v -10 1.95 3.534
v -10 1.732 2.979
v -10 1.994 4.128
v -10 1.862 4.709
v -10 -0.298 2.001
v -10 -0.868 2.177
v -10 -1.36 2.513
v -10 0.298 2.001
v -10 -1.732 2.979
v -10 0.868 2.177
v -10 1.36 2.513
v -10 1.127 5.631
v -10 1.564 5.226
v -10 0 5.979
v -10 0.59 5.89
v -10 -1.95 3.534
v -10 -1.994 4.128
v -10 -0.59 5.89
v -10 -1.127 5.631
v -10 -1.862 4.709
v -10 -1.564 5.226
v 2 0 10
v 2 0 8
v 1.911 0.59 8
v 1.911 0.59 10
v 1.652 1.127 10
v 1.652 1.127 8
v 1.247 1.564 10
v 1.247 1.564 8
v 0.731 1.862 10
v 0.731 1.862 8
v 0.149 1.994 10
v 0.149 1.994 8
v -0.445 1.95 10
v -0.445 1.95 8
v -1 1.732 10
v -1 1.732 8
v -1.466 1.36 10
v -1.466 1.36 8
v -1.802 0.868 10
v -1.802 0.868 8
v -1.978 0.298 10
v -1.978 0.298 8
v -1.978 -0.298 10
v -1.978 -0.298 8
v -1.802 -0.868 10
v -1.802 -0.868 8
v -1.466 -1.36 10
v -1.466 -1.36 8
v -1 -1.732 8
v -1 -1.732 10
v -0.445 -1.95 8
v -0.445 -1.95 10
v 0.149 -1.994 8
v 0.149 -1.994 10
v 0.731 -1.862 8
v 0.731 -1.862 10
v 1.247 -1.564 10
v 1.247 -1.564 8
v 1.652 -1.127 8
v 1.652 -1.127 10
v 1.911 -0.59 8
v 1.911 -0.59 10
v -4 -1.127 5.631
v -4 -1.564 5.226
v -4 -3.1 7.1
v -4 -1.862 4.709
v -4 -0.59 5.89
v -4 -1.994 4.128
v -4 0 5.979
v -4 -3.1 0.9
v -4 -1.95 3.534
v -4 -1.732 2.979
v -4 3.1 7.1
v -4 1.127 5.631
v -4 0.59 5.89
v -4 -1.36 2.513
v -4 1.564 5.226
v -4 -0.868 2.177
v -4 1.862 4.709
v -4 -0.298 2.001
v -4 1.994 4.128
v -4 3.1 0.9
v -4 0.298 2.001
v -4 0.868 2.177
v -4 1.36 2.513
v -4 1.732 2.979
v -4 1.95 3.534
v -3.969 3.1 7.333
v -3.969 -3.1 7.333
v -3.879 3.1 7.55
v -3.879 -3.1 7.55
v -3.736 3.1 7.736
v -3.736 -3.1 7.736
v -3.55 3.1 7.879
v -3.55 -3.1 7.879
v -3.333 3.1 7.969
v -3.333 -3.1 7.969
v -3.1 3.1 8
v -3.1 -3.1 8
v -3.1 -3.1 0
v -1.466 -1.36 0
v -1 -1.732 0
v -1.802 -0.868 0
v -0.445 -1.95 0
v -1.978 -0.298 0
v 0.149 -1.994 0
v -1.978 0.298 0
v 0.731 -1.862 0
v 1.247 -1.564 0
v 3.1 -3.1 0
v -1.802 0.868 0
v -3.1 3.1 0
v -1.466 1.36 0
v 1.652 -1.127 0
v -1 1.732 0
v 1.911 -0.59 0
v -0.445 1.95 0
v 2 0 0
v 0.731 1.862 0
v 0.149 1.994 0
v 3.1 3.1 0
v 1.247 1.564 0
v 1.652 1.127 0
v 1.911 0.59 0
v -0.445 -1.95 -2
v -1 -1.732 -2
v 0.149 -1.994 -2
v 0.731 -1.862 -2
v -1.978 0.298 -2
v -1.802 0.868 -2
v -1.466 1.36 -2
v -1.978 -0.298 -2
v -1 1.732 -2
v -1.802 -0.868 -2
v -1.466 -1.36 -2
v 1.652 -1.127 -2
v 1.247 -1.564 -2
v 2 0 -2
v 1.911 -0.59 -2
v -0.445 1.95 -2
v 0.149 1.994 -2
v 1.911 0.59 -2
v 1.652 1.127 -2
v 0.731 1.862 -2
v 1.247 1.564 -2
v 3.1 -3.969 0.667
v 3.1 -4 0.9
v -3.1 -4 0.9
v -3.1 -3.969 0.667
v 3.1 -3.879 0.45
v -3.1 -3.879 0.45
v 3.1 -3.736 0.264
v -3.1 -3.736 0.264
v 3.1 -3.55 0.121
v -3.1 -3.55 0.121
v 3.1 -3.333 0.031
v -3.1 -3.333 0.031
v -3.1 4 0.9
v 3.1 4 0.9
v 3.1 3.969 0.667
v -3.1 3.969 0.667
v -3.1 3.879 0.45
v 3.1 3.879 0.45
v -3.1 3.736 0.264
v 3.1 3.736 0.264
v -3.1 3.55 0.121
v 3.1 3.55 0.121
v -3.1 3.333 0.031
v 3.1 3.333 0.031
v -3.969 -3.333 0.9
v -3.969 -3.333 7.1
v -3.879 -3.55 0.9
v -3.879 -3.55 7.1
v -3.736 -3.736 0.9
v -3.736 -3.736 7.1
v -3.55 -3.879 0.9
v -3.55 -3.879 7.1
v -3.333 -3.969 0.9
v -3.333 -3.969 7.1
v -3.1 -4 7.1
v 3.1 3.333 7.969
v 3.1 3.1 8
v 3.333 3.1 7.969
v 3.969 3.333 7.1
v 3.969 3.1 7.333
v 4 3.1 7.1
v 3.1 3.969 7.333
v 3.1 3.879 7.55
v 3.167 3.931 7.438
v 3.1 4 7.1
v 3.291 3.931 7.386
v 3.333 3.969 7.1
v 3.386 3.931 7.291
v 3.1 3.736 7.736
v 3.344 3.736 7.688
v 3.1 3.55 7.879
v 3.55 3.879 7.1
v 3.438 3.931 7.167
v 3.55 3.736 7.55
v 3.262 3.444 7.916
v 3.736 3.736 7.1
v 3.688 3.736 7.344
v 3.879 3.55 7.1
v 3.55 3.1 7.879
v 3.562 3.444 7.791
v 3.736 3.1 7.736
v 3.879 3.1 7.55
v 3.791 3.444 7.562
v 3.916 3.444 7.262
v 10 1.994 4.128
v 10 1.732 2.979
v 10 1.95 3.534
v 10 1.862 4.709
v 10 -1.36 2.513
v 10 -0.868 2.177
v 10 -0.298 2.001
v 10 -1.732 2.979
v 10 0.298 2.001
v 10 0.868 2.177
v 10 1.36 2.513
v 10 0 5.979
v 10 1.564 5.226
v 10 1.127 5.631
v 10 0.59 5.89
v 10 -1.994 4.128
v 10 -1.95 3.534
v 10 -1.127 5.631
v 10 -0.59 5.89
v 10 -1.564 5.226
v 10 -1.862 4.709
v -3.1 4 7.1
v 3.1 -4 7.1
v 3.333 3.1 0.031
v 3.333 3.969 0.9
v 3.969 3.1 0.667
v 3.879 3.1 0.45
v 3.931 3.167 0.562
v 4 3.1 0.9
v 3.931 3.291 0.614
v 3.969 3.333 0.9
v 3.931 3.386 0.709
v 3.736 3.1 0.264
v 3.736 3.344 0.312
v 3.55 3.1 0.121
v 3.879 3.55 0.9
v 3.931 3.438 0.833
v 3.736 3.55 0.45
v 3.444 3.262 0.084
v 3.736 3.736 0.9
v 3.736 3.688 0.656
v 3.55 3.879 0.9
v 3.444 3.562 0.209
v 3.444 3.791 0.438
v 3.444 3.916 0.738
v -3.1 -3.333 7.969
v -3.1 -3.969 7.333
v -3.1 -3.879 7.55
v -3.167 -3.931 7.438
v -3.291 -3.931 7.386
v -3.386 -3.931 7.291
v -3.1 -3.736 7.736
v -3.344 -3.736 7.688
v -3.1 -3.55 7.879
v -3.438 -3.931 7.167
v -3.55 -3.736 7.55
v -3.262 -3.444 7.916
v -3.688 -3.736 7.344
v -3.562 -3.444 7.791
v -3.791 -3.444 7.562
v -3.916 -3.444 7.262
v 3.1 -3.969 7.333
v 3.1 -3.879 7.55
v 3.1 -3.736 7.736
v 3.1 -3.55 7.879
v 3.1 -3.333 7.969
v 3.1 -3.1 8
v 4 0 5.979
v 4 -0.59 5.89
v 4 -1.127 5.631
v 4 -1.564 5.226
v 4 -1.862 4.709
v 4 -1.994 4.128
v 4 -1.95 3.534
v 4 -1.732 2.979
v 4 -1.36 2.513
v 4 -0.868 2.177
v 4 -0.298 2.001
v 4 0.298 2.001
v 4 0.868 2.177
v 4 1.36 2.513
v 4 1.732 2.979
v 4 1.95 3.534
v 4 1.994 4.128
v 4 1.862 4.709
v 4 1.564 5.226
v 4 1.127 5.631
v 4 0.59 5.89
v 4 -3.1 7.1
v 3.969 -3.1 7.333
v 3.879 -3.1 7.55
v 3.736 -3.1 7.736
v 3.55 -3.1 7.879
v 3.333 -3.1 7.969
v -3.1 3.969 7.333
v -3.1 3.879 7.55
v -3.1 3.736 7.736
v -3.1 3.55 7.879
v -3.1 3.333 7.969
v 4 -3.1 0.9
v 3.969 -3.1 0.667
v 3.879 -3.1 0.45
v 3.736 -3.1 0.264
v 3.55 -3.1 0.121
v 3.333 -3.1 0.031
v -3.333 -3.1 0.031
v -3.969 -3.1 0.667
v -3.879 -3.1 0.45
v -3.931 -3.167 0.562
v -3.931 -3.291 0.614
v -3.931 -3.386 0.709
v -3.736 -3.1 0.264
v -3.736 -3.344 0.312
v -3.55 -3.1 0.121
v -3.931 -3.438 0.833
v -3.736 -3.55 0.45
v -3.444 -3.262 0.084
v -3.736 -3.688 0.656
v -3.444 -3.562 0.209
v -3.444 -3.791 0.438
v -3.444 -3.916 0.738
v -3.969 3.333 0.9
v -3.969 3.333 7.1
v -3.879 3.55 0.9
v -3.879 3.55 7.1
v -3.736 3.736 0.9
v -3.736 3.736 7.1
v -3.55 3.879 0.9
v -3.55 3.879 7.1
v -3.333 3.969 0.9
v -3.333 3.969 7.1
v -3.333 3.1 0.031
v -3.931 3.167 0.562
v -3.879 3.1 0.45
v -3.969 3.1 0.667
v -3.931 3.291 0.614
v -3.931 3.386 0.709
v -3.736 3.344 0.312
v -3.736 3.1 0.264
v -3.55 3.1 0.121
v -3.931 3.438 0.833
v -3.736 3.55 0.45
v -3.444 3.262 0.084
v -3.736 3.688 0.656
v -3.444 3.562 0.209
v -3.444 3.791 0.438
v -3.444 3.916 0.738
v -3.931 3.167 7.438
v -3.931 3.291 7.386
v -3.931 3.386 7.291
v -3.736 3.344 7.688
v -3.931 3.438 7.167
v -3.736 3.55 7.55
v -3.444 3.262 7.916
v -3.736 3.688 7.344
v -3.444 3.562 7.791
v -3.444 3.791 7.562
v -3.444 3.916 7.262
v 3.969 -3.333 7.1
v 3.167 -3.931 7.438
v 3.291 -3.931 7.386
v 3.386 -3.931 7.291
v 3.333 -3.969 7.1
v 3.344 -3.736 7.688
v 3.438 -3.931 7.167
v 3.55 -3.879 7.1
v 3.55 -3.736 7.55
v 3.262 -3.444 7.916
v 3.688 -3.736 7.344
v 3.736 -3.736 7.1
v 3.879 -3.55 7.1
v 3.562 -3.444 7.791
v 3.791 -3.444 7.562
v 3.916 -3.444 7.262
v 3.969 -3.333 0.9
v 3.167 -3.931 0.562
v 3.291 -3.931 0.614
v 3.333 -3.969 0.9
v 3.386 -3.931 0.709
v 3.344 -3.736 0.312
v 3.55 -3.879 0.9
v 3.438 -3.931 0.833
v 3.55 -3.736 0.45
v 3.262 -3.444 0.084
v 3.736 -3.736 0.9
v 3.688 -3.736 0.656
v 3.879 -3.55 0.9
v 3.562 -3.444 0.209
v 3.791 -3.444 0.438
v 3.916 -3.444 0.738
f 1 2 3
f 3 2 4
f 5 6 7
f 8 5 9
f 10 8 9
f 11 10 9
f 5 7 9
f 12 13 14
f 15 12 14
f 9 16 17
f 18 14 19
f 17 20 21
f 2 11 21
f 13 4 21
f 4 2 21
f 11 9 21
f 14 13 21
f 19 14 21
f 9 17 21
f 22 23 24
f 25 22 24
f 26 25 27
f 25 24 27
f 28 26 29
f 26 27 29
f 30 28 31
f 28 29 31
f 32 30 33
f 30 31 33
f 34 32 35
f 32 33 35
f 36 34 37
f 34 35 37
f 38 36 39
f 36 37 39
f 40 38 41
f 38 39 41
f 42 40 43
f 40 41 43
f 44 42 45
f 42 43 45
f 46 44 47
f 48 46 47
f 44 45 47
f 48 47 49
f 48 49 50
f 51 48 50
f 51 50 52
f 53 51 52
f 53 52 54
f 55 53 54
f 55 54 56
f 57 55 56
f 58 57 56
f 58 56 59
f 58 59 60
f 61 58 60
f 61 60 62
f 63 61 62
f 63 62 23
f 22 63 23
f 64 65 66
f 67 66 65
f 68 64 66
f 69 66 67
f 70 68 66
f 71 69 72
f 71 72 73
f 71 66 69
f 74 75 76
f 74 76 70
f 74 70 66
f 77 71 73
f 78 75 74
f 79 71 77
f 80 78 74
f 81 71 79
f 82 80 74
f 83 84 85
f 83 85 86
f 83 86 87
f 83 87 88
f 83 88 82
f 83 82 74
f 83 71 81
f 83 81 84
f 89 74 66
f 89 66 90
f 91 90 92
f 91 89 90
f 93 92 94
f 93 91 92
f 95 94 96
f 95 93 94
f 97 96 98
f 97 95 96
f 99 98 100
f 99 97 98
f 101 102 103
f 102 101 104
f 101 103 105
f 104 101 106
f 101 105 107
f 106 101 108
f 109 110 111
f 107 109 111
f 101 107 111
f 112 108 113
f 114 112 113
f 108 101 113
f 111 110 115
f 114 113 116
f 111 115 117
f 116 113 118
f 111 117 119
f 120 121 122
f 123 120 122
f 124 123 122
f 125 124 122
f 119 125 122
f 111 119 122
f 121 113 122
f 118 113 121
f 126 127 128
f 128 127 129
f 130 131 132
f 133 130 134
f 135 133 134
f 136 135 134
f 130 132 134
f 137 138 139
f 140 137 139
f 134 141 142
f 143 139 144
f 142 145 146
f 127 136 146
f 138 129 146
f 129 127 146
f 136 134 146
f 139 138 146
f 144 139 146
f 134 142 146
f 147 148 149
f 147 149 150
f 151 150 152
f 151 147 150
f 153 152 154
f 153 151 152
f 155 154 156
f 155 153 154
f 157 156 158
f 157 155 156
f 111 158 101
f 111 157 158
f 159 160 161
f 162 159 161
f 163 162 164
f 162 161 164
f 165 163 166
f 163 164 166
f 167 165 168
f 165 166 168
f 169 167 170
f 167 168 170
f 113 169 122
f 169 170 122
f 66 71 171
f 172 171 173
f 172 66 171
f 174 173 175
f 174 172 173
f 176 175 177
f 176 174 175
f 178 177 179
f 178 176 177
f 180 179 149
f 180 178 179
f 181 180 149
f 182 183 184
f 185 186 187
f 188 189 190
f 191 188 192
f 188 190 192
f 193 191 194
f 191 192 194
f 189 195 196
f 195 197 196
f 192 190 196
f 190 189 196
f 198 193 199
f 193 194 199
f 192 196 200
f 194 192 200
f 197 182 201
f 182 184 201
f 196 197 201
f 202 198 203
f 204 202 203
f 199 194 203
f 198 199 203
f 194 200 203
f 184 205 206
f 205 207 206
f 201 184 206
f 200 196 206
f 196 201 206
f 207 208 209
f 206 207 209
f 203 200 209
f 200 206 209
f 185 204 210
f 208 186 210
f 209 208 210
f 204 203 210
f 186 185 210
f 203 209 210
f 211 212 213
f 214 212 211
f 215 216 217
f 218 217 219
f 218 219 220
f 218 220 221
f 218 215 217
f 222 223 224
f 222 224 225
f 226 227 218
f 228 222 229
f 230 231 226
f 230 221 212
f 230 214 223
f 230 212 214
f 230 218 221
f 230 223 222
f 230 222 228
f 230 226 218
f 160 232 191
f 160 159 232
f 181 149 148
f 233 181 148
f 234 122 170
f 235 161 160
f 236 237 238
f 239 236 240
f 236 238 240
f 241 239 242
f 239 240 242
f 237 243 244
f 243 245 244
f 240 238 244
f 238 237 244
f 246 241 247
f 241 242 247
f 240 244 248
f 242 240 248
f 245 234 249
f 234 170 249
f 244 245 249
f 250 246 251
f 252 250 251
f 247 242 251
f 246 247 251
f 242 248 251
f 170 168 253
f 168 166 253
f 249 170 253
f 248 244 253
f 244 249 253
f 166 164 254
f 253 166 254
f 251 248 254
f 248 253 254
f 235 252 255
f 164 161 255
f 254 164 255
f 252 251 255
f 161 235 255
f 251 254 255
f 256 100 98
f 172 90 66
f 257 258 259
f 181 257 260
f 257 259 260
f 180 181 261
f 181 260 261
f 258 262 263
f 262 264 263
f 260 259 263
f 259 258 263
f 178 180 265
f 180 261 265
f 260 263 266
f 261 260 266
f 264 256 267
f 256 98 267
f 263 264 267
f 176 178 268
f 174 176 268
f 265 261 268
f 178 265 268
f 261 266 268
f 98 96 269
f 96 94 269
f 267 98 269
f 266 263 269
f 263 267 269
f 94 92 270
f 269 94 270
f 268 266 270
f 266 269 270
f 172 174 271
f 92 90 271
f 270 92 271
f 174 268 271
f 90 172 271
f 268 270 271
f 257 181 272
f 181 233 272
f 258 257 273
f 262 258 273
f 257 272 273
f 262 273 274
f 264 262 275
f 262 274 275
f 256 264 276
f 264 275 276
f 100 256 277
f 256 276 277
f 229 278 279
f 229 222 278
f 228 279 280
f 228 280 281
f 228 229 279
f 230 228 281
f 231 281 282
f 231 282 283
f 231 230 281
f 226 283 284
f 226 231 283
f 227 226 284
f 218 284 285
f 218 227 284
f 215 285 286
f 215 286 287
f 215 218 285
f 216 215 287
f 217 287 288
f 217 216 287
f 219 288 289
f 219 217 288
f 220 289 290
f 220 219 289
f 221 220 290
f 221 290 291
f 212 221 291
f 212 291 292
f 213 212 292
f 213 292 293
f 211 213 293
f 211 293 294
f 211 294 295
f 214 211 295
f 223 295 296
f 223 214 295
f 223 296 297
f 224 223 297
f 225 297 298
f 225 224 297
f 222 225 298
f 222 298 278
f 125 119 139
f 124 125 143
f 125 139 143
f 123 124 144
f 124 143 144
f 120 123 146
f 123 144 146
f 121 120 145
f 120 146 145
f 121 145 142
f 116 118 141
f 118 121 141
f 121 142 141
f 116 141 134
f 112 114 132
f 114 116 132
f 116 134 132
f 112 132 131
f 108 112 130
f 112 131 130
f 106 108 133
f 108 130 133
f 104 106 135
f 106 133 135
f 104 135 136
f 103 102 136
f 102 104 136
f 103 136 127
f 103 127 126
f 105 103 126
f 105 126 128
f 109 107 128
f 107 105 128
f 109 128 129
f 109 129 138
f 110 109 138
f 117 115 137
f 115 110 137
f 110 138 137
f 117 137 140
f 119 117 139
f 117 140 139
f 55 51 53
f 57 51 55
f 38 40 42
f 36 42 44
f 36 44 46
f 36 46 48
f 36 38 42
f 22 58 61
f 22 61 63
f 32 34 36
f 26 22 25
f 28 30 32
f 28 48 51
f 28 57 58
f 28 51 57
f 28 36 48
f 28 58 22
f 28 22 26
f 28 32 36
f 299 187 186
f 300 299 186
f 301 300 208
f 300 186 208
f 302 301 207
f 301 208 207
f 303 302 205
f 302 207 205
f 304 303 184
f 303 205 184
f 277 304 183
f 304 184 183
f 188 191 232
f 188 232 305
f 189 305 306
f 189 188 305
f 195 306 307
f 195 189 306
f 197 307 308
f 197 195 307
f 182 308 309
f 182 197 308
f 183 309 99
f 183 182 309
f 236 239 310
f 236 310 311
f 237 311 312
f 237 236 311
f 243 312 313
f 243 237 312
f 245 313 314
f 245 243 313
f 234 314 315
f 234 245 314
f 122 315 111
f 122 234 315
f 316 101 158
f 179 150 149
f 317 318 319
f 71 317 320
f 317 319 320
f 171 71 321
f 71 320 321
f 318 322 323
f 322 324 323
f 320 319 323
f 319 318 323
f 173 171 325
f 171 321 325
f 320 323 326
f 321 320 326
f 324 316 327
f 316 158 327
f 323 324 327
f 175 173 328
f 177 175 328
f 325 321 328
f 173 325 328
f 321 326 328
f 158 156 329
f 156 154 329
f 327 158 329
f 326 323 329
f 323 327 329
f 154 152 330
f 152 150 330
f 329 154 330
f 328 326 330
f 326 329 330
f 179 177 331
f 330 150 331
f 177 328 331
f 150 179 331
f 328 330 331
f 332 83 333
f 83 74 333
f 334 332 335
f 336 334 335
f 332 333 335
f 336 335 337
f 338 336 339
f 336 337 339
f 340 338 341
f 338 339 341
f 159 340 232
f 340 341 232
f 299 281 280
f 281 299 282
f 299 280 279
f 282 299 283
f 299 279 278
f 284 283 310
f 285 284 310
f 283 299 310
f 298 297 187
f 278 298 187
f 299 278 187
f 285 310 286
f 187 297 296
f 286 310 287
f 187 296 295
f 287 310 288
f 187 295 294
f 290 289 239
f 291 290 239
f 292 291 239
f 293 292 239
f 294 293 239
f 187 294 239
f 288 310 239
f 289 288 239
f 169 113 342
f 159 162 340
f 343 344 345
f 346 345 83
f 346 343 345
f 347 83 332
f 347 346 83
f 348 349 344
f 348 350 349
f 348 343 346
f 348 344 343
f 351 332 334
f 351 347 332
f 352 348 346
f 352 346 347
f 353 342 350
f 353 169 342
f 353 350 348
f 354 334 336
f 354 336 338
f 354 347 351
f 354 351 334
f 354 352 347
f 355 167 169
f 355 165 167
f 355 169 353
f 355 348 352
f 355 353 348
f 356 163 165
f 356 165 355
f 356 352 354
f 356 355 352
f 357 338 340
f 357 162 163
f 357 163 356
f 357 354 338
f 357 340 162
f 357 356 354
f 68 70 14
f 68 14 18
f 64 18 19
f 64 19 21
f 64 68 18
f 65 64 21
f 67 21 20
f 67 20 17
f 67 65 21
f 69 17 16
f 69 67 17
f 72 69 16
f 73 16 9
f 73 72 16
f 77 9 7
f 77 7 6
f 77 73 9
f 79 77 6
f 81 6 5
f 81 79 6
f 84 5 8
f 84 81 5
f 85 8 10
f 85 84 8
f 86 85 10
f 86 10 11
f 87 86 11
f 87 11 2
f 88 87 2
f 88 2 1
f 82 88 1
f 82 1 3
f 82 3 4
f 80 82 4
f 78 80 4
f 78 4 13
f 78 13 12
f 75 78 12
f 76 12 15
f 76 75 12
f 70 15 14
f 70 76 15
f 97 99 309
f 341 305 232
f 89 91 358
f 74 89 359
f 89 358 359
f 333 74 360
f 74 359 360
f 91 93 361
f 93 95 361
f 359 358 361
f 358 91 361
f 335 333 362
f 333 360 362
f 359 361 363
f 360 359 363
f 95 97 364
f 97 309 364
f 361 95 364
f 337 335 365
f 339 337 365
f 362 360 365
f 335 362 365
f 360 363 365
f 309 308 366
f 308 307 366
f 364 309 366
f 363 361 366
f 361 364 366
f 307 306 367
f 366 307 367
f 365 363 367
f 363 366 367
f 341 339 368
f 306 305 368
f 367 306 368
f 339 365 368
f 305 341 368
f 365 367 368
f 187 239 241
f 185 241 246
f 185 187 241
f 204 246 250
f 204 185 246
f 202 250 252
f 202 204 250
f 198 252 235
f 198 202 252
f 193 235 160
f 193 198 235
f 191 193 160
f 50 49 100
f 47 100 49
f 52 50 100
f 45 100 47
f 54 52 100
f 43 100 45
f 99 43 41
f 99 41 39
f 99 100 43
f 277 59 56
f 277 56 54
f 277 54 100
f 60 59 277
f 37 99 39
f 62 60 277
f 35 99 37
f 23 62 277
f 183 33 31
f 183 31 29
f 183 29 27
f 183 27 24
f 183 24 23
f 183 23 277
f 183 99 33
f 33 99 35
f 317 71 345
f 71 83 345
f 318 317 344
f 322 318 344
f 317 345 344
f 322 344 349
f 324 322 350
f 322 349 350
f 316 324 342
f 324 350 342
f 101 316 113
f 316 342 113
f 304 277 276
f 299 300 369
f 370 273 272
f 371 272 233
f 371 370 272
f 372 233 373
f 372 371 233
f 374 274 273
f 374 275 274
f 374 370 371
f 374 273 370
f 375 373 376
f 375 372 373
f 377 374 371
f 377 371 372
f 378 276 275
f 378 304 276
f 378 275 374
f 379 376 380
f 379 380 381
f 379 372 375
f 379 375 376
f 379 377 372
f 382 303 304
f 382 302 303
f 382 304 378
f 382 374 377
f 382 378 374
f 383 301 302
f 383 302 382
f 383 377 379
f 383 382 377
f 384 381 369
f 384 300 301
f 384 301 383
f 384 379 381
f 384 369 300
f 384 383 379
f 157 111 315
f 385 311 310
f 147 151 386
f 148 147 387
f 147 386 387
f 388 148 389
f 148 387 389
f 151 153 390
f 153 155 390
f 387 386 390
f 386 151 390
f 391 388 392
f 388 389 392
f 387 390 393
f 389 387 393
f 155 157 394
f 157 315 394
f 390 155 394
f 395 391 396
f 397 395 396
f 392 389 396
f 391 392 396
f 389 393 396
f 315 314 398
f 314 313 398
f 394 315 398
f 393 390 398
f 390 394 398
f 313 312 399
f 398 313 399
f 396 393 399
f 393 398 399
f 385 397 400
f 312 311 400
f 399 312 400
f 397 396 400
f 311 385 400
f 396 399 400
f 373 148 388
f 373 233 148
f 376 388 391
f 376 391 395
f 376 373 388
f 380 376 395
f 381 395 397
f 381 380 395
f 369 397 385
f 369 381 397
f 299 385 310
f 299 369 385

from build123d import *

# Parameters (mm, degrees)
SKETCH1_W                = 8
SKETCH1_H                = 8
BOSS_EXTRUDE1_DEPTH      = 8
FILLET1_R                = 0.9
BOSS_EXTRUDE2_DEPTH      = 2
BOSS_EXTRUDE2_DEPTH_BACK = 10
SKETCH2_R                = 2
SKETCH4_R                = 2
BOSS_EXTRUDE6_DEPTH      = 10


with BuildPart() as part:
    # Sketch1 → Boss-Extrude1 (new body)
    with BuildSketch(Plane.XY):
        Rectangle(SKETCH1_W, SKETCH1_H)
    extrude(amount=BOSS_EXTRUDE1_DEPTH)

    # Fillet1
    fillet1_edges = [part.edges().sort_by_distance(p)[0] for p in [
        (4, 0, 8),
        (0, 4, 8),
        (-4, 0, 8),
        (0, 4, 0),
        (4, 0, 0),
        (0, -4, 0),
        (-4, 0, 0),
        (0, -4, 8),
        (-4, 4, 4),
        (4, 4, 4),
        (4, -4, 4),
        (-4, -4, 4),
    ]]
    fillet(fillet1_edges, radius=FILLET1_R)

    # Sketch2 → Boss-Extrude2 (add, two sides: drawn at the far end of the back side and taken through both)
    with BuildSketch(Plane.XY.offset(8).offset(-BOSS_EXTRUDE2_DEPTH_BACK)):
        Circle(SKETCH2_R)
    extrude(amount=BOSS_EXTRUDE2_DEPTH + BOSS_EXTRUDE2_DEPTH_BACK)

    # Sketch4 → Boss-Extrude6 (add, symmetric)
    with BuildSketch(Plane(origin=(0, 0, 0), x_dir=(0, 0, -1), z_dir=(1, 0, 0))):
        with Locations(Location((-3.978609227, 0, 0), (0, 0, 180))):
            Circle(SKETCH4_R)
    extrude(amount=BOSS_EXTRUDE6_DEPTH, both=True)


solid = part.part
